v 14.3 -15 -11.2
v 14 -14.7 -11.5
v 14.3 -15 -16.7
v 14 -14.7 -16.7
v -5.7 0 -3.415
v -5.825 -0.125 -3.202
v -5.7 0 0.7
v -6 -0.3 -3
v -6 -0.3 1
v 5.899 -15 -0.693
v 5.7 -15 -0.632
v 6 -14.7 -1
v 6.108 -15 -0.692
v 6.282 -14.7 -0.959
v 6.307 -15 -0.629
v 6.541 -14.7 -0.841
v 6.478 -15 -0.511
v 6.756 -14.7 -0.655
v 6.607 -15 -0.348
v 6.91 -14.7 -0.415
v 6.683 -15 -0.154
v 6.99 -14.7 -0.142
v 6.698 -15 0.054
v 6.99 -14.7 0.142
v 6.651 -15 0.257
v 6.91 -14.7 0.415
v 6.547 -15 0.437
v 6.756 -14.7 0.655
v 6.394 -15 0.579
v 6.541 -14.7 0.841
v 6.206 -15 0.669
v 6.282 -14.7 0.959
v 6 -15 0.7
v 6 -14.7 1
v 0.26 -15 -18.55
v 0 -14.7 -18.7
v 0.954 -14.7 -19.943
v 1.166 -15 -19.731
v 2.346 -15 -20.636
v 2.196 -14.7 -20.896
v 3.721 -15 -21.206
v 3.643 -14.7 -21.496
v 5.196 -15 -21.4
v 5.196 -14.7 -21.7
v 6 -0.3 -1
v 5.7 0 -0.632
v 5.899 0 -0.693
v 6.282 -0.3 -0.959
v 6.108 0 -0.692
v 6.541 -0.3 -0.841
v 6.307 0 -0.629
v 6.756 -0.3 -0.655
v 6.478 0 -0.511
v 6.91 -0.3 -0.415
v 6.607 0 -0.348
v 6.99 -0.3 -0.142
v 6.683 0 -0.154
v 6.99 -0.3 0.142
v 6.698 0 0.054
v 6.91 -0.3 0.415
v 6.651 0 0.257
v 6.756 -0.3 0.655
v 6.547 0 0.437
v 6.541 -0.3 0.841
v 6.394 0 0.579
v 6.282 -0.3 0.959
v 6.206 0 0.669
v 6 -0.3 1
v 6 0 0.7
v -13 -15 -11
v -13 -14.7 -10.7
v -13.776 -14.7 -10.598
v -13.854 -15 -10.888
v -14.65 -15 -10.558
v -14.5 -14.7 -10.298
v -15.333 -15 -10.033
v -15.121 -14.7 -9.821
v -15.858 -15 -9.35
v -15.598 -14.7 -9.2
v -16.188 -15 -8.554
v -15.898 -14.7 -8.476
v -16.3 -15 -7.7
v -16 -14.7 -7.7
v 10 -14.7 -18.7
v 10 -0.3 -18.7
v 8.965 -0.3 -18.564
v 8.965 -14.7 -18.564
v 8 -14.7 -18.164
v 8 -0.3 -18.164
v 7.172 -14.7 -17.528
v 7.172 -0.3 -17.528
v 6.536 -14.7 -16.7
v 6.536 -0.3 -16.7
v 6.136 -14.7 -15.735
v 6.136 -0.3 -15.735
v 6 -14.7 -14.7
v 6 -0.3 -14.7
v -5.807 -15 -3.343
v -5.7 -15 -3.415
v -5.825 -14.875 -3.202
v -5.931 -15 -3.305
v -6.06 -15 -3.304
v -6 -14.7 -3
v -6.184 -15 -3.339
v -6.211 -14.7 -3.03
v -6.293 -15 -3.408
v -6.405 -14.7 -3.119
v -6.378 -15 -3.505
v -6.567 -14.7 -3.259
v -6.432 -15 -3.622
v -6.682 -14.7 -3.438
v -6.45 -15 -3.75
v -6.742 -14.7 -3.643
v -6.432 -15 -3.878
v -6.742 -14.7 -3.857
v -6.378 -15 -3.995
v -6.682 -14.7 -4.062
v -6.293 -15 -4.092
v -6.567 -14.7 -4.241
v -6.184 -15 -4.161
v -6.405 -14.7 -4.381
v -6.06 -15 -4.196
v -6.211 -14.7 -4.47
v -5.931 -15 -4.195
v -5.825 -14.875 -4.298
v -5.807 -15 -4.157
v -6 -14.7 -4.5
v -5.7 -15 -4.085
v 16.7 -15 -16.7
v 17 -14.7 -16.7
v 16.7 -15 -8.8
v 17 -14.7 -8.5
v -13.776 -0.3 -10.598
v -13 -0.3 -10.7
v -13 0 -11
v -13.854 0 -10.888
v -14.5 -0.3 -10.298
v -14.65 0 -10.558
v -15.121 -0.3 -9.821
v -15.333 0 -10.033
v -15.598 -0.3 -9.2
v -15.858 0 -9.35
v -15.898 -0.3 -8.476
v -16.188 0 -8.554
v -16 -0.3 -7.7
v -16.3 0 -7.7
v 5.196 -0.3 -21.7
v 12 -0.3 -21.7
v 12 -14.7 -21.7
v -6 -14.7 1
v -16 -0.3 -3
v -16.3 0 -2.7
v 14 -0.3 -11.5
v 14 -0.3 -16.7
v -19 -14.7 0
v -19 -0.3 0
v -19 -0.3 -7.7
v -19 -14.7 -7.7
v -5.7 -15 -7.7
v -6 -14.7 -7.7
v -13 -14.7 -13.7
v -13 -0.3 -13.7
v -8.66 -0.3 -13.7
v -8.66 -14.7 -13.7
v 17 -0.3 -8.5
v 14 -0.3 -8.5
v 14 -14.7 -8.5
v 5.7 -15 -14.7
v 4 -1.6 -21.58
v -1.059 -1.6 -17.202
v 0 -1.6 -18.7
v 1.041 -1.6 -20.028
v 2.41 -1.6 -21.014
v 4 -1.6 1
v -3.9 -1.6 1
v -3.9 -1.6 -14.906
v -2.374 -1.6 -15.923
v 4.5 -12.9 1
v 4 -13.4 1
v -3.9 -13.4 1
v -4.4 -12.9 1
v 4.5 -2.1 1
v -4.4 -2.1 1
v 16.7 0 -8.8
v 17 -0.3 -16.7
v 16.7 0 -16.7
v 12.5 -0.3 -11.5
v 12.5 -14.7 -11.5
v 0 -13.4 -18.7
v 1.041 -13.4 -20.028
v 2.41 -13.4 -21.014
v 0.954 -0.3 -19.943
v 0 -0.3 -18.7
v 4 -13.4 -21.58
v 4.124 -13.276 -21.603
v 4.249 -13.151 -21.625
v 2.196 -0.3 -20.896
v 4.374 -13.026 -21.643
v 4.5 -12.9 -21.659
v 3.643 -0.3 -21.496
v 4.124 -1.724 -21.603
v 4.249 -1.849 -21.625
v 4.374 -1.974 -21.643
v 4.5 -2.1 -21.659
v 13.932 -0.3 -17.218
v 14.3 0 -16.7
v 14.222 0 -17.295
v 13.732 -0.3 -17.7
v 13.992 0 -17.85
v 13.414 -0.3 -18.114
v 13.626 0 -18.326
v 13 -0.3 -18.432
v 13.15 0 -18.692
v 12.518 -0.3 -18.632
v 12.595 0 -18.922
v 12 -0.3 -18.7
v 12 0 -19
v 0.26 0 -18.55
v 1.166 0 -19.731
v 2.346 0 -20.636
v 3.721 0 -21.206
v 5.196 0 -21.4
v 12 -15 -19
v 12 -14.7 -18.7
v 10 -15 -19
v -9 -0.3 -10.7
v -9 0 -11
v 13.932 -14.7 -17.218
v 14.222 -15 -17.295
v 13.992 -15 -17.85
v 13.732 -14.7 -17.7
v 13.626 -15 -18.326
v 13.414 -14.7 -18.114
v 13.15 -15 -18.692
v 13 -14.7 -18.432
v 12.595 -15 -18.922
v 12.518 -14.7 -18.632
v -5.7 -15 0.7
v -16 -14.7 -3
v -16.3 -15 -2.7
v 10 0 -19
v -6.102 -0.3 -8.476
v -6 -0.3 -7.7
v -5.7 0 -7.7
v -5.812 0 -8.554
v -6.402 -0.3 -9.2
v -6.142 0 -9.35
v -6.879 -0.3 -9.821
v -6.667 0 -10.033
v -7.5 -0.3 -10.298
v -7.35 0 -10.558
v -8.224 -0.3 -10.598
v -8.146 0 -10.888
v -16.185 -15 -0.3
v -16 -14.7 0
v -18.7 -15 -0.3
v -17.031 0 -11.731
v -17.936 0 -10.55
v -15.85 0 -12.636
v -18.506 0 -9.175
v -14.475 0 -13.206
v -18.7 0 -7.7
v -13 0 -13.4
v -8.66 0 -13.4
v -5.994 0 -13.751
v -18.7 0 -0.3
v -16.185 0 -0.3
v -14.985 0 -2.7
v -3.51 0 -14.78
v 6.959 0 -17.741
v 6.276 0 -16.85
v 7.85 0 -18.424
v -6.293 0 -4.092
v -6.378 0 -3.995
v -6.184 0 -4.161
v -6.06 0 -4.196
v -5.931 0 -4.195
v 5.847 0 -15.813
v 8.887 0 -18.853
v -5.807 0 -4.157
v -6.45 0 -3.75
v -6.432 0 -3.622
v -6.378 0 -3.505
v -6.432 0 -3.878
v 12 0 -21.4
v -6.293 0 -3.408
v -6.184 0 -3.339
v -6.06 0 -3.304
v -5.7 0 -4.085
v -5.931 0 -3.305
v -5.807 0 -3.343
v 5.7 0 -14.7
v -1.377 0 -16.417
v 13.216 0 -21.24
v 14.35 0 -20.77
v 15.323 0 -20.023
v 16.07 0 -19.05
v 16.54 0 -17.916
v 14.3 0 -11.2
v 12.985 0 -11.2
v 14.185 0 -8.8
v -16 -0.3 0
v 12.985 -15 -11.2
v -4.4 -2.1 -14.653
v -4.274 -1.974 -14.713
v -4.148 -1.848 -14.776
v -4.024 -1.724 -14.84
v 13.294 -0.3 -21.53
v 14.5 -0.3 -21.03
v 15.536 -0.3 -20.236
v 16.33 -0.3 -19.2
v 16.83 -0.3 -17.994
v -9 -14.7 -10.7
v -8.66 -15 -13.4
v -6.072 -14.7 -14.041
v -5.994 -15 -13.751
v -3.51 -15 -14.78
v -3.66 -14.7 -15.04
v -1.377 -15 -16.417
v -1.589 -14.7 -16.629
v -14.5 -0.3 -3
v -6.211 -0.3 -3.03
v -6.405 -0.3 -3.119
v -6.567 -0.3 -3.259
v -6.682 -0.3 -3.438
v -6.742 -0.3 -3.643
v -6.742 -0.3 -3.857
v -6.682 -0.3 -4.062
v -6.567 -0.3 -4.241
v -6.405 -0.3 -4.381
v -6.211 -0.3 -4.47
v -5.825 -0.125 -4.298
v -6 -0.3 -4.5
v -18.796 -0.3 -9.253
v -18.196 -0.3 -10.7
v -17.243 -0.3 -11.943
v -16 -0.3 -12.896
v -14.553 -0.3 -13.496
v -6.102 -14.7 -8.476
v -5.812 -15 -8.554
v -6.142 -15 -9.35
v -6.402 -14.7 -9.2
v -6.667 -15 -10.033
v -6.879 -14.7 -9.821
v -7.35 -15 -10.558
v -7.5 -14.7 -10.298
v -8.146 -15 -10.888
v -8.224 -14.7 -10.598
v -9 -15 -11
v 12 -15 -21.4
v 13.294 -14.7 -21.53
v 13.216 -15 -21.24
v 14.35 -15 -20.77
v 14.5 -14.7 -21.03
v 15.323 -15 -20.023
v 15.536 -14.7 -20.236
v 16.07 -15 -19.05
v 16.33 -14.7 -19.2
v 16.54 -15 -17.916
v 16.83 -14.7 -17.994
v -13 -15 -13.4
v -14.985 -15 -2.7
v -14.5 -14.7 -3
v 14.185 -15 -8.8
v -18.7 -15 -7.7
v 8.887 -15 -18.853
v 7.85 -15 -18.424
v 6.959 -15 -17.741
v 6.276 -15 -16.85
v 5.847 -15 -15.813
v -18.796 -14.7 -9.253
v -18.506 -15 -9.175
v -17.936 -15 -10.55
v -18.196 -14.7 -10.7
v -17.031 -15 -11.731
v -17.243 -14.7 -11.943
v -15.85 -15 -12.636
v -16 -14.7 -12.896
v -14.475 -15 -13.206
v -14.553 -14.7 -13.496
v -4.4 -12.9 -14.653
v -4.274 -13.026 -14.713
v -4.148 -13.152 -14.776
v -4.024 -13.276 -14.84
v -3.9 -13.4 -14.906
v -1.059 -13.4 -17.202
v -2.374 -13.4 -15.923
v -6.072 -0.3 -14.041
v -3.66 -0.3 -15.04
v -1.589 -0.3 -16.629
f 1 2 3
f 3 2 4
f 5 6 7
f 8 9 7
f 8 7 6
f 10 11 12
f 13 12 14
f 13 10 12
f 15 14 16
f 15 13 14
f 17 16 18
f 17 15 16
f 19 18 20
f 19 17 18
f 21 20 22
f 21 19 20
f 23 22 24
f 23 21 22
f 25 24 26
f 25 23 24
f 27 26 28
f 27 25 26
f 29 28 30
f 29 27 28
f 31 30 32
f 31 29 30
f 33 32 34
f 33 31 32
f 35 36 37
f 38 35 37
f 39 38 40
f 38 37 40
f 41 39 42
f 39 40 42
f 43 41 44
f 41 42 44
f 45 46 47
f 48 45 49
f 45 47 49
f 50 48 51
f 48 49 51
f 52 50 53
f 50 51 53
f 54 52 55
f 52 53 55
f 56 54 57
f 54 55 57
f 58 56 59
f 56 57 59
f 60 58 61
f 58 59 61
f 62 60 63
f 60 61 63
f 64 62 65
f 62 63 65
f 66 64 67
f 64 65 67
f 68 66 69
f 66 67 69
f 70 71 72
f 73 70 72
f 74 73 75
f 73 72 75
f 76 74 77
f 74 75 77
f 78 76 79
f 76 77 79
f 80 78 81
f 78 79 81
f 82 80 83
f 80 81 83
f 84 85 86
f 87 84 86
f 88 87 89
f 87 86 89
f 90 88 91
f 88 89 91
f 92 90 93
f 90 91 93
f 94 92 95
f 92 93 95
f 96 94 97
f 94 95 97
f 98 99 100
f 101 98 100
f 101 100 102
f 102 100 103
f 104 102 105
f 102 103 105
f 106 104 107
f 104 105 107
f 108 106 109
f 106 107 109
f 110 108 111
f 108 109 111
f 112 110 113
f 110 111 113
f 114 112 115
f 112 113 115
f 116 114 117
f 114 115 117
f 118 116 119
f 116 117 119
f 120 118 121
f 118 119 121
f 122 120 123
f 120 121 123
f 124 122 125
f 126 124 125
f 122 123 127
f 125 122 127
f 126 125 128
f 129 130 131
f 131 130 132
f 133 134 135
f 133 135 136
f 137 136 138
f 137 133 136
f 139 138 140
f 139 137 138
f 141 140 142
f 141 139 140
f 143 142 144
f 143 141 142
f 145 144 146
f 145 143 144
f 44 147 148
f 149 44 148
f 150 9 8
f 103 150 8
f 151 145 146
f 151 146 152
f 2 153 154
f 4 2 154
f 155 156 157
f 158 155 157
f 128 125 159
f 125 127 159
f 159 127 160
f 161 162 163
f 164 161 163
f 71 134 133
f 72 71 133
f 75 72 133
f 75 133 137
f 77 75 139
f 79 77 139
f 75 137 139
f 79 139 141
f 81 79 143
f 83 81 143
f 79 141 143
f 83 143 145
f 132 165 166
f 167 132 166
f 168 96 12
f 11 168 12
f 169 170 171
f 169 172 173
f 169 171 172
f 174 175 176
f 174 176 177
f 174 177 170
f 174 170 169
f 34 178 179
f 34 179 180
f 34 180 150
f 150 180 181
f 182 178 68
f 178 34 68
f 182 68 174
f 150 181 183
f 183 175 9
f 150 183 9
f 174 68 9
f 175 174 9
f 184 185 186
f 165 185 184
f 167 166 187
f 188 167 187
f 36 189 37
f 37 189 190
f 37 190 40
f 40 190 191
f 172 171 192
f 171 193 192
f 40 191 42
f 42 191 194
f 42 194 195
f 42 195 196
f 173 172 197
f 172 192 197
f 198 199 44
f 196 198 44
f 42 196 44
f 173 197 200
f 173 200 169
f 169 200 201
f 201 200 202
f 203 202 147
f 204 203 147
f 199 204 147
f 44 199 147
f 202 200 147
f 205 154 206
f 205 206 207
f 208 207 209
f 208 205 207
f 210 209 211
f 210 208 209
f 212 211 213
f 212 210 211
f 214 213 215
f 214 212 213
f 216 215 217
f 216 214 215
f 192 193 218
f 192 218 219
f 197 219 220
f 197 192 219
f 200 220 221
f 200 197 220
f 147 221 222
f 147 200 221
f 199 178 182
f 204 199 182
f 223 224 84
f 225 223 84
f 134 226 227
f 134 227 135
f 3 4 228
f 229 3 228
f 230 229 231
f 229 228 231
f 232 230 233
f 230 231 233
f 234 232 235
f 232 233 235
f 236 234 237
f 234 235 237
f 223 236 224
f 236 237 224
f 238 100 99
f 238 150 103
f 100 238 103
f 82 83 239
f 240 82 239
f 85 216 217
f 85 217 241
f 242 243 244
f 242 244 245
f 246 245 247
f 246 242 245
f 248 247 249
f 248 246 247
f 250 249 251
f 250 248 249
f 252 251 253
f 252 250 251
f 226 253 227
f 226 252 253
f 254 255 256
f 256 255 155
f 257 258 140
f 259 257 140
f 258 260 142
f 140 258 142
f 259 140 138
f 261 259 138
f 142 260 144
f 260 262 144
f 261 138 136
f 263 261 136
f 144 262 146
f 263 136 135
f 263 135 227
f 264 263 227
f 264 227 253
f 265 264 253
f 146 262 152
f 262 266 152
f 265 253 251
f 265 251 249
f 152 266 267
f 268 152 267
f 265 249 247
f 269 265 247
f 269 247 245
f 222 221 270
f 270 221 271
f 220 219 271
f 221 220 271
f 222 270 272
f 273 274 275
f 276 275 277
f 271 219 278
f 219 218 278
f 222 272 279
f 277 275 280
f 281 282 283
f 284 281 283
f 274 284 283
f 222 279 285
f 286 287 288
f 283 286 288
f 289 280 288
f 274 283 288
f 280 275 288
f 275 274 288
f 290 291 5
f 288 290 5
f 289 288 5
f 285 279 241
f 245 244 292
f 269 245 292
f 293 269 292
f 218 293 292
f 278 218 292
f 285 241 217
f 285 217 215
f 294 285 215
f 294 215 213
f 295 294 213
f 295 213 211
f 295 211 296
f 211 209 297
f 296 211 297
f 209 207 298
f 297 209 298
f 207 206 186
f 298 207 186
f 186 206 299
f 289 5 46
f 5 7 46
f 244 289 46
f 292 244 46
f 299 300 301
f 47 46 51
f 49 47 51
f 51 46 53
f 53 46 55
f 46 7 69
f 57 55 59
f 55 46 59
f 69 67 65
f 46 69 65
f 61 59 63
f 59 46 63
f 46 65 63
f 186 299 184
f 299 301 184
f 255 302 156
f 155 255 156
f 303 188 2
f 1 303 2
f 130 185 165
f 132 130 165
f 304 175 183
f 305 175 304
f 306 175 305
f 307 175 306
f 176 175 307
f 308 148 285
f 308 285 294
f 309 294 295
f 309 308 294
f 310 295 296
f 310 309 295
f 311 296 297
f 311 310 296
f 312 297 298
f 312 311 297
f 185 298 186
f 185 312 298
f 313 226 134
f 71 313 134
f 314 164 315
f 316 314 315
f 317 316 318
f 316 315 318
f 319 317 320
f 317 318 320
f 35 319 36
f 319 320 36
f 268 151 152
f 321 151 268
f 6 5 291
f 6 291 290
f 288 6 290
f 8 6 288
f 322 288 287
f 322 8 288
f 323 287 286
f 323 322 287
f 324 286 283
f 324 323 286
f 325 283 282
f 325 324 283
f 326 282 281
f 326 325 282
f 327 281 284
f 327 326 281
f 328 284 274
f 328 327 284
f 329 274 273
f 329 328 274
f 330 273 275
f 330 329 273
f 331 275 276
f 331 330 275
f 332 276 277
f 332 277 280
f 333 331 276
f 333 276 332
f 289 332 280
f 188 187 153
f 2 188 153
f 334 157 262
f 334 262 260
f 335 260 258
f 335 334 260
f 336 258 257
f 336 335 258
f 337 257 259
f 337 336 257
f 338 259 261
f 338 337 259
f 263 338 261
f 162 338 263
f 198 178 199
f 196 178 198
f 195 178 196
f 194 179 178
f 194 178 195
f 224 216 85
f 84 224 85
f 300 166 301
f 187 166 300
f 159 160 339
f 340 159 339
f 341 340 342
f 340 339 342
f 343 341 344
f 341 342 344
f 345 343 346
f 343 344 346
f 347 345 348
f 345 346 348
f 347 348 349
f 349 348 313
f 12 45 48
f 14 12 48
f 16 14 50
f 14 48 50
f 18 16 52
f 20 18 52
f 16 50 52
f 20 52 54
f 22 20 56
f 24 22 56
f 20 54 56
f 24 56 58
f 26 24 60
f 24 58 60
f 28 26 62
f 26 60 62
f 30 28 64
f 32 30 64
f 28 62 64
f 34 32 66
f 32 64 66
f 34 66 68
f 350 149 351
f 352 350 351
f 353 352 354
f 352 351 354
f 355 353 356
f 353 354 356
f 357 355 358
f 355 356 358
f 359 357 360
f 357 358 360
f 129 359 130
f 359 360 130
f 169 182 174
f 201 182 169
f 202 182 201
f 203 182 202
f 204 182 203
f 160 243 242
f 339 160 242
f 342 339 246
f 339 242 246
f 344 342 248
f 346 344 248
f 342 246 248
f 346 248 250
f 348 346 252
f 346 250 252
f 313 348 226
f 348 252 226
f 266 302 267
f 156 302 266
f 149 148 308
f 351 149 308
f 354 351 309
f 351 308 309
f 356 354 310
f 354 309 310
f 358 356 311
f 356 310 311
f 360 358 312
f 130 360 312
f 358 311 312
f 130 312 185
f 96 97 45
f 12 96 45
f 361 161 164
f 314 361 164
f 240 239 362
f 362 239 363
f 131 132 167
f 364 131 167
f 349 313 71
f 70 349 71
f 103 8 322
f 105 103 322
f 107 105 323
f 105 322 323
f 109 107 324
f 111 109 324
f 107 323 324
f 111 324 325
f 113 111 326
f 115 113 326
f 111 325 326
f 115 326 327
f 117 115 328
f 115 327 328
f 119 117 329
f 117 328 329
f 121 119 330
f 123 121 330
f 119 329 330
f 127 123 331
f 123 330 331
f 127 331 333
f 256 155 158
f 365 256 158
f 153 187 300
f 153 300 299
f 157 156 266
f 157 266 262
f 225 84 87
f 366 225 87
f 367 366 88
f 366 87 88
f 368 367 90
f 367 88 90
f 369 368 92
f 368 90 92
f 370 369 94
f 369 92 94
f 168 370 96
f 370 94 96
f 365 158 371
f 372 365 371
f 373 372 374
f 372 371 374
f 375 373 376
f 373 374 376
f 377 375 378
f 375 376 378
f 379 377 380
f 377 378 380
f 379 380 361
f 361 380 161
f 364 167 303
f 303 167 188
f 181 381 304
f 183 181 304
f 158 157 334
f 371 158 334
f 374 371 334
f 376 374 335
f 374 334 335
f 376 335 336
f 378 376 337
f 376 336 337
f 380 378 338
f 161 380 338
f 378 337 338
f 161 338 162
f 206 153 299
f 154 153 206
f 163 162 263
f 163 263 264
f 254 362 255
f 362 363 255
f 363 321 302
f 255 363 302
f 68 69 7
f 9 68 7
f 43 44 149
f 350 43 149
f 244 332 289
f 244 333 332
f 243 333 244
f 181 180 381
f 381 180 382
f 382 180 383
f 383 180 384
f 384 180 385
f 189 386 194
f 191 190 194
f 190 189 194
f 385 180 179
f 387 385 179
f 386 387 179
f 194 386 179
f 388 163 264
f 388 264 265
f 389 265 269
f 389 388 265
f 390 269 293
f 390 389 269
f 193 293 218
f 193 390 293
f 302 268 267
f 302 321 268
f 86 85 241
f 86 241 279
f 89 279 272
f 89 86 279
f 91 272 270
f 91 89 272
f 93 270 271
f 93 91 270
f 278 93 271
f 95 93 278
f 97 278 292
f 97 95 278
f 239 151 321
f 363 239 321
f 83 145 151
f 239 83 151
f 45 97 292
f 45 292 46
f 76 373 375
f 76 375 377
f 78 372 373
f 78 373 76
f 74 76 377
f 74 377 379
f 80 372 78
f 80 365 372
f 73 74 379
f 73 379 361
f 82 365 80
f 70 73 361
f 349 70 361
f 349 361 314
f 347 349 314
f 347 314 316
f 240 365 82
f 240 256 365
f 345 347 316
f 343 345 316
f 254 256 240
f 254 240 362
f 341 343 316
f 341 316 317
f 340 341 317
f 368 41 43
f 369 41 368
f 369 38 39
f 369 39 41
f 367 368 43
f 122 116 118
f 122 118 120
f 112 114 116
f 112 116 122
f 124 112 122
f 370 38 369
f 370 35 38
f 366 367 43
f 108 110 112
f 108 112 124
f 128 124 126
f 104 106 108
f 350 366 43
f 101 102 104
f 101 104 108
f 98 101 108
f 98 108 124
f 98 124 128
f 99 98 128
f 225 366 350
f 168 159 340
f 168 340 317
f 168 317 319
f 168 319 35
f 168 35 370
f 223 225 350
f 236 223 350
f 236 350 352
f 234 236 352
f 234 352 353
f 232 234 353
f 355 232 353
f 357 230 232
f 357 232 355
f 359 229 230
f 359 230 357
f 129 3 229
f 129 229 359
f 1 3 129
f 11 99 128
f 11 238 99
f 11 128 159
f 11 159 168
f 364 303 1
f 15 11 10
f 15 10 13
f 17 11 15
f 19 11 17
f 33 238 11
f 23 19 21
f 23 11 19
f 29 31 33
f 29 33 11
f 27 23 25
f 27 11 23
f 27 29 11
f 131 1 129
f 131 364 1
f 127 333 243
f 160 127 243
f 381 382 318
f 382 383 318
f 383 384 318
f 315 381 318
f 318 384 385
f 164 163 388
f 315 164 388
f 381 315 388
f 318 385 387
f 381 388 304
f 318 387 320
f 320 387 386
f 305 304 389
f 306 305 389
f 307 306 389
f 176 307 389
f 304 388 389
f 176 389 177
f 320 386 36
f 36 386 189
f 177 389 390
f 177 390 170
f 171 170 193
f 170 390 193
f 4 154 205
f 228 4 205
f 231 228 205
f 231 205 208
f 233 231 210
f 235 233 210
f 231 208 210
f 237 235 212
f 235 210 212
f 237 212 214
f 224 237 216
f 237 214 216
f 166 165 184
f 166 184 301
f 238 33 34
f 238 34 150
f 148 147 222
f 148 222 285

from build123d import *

# Parameters (mm, degrees)
F1_DEPTH = 15
F2_W     = 8.9
F2_H     = 11.8
F3_DEPTH = 25
F4_SIZE  = 0.3
F5_SIZE  = 0.5


with BuildPart() as f1:
    # F0 (on Front) → F1 (new body)
    with BuildSketch(Plane.XZ):
        with BuildLine():
            Line((6, 1), (-6, 1))
            Line((-6, 1), (-6, -3))
            ThreePointArc((-6, -3), (-6.75, -3.75), (-6, -4.5))
            Line((-6, -4.5), (-6, -5.7))
            Line((-6, -5.7), (-6, -7.7))
            ThreePointArc((-6, -7.7), (-6.8786796564, -9.8213203436), (-9, -10.7))
            Line((-9, -10.7), (-13, -10.7))
            ThreePointArc((-13, -10.7), (-15.1213203436, -9.8213203436), (-16, -7.7))
            Line((-16, -7.7), (-16, -5.7))
            Line((-16, -5.7), (-16, -3))
            Line((-16, -3), (-14.5, -3))
            Line((-14.5, -3), (-16, 0))
            Line((-16, 0), (-19, 0))
            Line((-19, 0), (-19, -7.7))
            ThreePointArc((-19, -7.7), (-17.2426406871, -11.9426406871), (-13, -13.7))
            Line((-13, -13.7), (-8.6602540378, -13.7))
            ThreePointArc((-8.6602540378, -13.7), (-3.6602540378, -15.0397459622), (0, -18.7))
            ThreePointArc((0, -18.7), (2.1961524227, -20.8961524227), (5.1961524227, -21.7))
            Line((5.1961524227, -21.7), (12, -21.7))
            ThreePointArc((12, -21.7), (15.5355339059, -20.2355339059), (17, -16.7))
            Line((17, -16.7), (17, -8.5))
            Line((17, -8.5), (14, -8.5))
            Line((14, -8.5), (12.5, -11.5))
            Line((12.5, -11.5), (14, -11.5))
            Line((14, -11.5), (14, -14.7))
            Line((14, -14.7), (14, -16.7))
            ThreePointArc((14, -16.7), (13.4142135624, -18.1142135624), (12, -18.7))
            Line((12, -18.7), (10, -18.7))
            ThreePointArc((10, -18.7), (7.1715728753, -17.5284271247), (6, -14.7))
            Line((6, -14.7), (6, -1))
            ThreePointArc((6, -1), (7, 0), (6, 1))
        make_face()
    extrude(amount=F1_DEPTH)

    # F2 (on face) → F3 (cut)
    with BuildSketch(Plane.XY.offset(1)):
        with Locations((0.05, -7.5)):
            Rectangle(F2_W, F2_H)
    extrude(amount=-F3_DEPTH, mode=Mode.SUBTRACT)

    # F4
    f4_edges = [f1.edges().sort_by_distance(p)[0] for p in [
        (11, -15, -18.7),
        (7.171573, -15, -17.528427),
        (6, -15, -7.85),
        (7, -15, 0),
        (0, -15, 1),
        (-6, -15, -1),
        (-6.75, -15, -3.75),
        (-6, -15, -6.1),
        (-6.87868, -15, -9.82132),
        (-11, -15, -10.7),
        (-15.12132, -15, -9.82132),
        (-16, -15, -5.35),
        (-15.25, -15, -3),
        (-15.25, -15, -1.5),
        (-17.5, -15, 0),
        (-19, -15, -3.85),
        (-17.242641, -15, -11.942641),
        (-10.830127, -15, -13.7),
        (-3.660254, -15, -15.039746),
        (2.196152, -15, -20.896152),
        (8.598076, -15, -21.7),
        (15.535534, -15, -20.235534),
        (17, -15, -12.6),
        (15.5, -15, -8.5),
        (13.25, -15, -10),
        (13.25, -15, -11.5),
        (14, -15, -14.1),
        (13.414214, -15, -18.114214),
        (11, 0, -18.7),
        (7.171573, 0, -17.528427),
        (6, 0, -7.85),
        (7, 0, 0),
        (0, 0, 1),
        (-6, 0, -1),
        (-6.75, 0, -3.75),
        (-6, 0, -6.1),
        (-6.87868, 0, -9.82132),
        (-11, 0, -10.7),
        (-15.12132, 0, -9.82132),
        (-16, 0, -5.35),
        (-15.25, 0, -3),
        (-15.25, 0, -1.5),
        (-17.5, 0, 0),
        (-19, 0, -3.85),
        (-17.242641, 0, -11.942641),
        (-10.830127, 0, -13.7),
        (-3.660254, 0, -15.039746),
        (2.196152, 0, -20.896152),
        (8.598076, 0, -21.7),
        (15.535534, 0, -20.235534),
        (17, 0, -12.6),
        (15.5, 0, -8.5),
        (13.25, 0, -10),
        (13.25, 0, -11.5),
        (14, 0, -14.1),
        (13.414214, 0, -18.114214),
    ]]
    chamfer(f4_edges, length=F4_SIZE)

    # F5
    f5_edges = [f1.edges().sort_by_distance(p)[0] for p in [
        (-4.4, -13.4, -6.826444),
        (4.5, -13.4, -10.329739),
        (4.5, -1.6, -10.329739),
        (-4.4, -1.6, -6.826444),
    ]]
    chamfer(f5_edges, length=F5_SIZE)


solid = f1.part
